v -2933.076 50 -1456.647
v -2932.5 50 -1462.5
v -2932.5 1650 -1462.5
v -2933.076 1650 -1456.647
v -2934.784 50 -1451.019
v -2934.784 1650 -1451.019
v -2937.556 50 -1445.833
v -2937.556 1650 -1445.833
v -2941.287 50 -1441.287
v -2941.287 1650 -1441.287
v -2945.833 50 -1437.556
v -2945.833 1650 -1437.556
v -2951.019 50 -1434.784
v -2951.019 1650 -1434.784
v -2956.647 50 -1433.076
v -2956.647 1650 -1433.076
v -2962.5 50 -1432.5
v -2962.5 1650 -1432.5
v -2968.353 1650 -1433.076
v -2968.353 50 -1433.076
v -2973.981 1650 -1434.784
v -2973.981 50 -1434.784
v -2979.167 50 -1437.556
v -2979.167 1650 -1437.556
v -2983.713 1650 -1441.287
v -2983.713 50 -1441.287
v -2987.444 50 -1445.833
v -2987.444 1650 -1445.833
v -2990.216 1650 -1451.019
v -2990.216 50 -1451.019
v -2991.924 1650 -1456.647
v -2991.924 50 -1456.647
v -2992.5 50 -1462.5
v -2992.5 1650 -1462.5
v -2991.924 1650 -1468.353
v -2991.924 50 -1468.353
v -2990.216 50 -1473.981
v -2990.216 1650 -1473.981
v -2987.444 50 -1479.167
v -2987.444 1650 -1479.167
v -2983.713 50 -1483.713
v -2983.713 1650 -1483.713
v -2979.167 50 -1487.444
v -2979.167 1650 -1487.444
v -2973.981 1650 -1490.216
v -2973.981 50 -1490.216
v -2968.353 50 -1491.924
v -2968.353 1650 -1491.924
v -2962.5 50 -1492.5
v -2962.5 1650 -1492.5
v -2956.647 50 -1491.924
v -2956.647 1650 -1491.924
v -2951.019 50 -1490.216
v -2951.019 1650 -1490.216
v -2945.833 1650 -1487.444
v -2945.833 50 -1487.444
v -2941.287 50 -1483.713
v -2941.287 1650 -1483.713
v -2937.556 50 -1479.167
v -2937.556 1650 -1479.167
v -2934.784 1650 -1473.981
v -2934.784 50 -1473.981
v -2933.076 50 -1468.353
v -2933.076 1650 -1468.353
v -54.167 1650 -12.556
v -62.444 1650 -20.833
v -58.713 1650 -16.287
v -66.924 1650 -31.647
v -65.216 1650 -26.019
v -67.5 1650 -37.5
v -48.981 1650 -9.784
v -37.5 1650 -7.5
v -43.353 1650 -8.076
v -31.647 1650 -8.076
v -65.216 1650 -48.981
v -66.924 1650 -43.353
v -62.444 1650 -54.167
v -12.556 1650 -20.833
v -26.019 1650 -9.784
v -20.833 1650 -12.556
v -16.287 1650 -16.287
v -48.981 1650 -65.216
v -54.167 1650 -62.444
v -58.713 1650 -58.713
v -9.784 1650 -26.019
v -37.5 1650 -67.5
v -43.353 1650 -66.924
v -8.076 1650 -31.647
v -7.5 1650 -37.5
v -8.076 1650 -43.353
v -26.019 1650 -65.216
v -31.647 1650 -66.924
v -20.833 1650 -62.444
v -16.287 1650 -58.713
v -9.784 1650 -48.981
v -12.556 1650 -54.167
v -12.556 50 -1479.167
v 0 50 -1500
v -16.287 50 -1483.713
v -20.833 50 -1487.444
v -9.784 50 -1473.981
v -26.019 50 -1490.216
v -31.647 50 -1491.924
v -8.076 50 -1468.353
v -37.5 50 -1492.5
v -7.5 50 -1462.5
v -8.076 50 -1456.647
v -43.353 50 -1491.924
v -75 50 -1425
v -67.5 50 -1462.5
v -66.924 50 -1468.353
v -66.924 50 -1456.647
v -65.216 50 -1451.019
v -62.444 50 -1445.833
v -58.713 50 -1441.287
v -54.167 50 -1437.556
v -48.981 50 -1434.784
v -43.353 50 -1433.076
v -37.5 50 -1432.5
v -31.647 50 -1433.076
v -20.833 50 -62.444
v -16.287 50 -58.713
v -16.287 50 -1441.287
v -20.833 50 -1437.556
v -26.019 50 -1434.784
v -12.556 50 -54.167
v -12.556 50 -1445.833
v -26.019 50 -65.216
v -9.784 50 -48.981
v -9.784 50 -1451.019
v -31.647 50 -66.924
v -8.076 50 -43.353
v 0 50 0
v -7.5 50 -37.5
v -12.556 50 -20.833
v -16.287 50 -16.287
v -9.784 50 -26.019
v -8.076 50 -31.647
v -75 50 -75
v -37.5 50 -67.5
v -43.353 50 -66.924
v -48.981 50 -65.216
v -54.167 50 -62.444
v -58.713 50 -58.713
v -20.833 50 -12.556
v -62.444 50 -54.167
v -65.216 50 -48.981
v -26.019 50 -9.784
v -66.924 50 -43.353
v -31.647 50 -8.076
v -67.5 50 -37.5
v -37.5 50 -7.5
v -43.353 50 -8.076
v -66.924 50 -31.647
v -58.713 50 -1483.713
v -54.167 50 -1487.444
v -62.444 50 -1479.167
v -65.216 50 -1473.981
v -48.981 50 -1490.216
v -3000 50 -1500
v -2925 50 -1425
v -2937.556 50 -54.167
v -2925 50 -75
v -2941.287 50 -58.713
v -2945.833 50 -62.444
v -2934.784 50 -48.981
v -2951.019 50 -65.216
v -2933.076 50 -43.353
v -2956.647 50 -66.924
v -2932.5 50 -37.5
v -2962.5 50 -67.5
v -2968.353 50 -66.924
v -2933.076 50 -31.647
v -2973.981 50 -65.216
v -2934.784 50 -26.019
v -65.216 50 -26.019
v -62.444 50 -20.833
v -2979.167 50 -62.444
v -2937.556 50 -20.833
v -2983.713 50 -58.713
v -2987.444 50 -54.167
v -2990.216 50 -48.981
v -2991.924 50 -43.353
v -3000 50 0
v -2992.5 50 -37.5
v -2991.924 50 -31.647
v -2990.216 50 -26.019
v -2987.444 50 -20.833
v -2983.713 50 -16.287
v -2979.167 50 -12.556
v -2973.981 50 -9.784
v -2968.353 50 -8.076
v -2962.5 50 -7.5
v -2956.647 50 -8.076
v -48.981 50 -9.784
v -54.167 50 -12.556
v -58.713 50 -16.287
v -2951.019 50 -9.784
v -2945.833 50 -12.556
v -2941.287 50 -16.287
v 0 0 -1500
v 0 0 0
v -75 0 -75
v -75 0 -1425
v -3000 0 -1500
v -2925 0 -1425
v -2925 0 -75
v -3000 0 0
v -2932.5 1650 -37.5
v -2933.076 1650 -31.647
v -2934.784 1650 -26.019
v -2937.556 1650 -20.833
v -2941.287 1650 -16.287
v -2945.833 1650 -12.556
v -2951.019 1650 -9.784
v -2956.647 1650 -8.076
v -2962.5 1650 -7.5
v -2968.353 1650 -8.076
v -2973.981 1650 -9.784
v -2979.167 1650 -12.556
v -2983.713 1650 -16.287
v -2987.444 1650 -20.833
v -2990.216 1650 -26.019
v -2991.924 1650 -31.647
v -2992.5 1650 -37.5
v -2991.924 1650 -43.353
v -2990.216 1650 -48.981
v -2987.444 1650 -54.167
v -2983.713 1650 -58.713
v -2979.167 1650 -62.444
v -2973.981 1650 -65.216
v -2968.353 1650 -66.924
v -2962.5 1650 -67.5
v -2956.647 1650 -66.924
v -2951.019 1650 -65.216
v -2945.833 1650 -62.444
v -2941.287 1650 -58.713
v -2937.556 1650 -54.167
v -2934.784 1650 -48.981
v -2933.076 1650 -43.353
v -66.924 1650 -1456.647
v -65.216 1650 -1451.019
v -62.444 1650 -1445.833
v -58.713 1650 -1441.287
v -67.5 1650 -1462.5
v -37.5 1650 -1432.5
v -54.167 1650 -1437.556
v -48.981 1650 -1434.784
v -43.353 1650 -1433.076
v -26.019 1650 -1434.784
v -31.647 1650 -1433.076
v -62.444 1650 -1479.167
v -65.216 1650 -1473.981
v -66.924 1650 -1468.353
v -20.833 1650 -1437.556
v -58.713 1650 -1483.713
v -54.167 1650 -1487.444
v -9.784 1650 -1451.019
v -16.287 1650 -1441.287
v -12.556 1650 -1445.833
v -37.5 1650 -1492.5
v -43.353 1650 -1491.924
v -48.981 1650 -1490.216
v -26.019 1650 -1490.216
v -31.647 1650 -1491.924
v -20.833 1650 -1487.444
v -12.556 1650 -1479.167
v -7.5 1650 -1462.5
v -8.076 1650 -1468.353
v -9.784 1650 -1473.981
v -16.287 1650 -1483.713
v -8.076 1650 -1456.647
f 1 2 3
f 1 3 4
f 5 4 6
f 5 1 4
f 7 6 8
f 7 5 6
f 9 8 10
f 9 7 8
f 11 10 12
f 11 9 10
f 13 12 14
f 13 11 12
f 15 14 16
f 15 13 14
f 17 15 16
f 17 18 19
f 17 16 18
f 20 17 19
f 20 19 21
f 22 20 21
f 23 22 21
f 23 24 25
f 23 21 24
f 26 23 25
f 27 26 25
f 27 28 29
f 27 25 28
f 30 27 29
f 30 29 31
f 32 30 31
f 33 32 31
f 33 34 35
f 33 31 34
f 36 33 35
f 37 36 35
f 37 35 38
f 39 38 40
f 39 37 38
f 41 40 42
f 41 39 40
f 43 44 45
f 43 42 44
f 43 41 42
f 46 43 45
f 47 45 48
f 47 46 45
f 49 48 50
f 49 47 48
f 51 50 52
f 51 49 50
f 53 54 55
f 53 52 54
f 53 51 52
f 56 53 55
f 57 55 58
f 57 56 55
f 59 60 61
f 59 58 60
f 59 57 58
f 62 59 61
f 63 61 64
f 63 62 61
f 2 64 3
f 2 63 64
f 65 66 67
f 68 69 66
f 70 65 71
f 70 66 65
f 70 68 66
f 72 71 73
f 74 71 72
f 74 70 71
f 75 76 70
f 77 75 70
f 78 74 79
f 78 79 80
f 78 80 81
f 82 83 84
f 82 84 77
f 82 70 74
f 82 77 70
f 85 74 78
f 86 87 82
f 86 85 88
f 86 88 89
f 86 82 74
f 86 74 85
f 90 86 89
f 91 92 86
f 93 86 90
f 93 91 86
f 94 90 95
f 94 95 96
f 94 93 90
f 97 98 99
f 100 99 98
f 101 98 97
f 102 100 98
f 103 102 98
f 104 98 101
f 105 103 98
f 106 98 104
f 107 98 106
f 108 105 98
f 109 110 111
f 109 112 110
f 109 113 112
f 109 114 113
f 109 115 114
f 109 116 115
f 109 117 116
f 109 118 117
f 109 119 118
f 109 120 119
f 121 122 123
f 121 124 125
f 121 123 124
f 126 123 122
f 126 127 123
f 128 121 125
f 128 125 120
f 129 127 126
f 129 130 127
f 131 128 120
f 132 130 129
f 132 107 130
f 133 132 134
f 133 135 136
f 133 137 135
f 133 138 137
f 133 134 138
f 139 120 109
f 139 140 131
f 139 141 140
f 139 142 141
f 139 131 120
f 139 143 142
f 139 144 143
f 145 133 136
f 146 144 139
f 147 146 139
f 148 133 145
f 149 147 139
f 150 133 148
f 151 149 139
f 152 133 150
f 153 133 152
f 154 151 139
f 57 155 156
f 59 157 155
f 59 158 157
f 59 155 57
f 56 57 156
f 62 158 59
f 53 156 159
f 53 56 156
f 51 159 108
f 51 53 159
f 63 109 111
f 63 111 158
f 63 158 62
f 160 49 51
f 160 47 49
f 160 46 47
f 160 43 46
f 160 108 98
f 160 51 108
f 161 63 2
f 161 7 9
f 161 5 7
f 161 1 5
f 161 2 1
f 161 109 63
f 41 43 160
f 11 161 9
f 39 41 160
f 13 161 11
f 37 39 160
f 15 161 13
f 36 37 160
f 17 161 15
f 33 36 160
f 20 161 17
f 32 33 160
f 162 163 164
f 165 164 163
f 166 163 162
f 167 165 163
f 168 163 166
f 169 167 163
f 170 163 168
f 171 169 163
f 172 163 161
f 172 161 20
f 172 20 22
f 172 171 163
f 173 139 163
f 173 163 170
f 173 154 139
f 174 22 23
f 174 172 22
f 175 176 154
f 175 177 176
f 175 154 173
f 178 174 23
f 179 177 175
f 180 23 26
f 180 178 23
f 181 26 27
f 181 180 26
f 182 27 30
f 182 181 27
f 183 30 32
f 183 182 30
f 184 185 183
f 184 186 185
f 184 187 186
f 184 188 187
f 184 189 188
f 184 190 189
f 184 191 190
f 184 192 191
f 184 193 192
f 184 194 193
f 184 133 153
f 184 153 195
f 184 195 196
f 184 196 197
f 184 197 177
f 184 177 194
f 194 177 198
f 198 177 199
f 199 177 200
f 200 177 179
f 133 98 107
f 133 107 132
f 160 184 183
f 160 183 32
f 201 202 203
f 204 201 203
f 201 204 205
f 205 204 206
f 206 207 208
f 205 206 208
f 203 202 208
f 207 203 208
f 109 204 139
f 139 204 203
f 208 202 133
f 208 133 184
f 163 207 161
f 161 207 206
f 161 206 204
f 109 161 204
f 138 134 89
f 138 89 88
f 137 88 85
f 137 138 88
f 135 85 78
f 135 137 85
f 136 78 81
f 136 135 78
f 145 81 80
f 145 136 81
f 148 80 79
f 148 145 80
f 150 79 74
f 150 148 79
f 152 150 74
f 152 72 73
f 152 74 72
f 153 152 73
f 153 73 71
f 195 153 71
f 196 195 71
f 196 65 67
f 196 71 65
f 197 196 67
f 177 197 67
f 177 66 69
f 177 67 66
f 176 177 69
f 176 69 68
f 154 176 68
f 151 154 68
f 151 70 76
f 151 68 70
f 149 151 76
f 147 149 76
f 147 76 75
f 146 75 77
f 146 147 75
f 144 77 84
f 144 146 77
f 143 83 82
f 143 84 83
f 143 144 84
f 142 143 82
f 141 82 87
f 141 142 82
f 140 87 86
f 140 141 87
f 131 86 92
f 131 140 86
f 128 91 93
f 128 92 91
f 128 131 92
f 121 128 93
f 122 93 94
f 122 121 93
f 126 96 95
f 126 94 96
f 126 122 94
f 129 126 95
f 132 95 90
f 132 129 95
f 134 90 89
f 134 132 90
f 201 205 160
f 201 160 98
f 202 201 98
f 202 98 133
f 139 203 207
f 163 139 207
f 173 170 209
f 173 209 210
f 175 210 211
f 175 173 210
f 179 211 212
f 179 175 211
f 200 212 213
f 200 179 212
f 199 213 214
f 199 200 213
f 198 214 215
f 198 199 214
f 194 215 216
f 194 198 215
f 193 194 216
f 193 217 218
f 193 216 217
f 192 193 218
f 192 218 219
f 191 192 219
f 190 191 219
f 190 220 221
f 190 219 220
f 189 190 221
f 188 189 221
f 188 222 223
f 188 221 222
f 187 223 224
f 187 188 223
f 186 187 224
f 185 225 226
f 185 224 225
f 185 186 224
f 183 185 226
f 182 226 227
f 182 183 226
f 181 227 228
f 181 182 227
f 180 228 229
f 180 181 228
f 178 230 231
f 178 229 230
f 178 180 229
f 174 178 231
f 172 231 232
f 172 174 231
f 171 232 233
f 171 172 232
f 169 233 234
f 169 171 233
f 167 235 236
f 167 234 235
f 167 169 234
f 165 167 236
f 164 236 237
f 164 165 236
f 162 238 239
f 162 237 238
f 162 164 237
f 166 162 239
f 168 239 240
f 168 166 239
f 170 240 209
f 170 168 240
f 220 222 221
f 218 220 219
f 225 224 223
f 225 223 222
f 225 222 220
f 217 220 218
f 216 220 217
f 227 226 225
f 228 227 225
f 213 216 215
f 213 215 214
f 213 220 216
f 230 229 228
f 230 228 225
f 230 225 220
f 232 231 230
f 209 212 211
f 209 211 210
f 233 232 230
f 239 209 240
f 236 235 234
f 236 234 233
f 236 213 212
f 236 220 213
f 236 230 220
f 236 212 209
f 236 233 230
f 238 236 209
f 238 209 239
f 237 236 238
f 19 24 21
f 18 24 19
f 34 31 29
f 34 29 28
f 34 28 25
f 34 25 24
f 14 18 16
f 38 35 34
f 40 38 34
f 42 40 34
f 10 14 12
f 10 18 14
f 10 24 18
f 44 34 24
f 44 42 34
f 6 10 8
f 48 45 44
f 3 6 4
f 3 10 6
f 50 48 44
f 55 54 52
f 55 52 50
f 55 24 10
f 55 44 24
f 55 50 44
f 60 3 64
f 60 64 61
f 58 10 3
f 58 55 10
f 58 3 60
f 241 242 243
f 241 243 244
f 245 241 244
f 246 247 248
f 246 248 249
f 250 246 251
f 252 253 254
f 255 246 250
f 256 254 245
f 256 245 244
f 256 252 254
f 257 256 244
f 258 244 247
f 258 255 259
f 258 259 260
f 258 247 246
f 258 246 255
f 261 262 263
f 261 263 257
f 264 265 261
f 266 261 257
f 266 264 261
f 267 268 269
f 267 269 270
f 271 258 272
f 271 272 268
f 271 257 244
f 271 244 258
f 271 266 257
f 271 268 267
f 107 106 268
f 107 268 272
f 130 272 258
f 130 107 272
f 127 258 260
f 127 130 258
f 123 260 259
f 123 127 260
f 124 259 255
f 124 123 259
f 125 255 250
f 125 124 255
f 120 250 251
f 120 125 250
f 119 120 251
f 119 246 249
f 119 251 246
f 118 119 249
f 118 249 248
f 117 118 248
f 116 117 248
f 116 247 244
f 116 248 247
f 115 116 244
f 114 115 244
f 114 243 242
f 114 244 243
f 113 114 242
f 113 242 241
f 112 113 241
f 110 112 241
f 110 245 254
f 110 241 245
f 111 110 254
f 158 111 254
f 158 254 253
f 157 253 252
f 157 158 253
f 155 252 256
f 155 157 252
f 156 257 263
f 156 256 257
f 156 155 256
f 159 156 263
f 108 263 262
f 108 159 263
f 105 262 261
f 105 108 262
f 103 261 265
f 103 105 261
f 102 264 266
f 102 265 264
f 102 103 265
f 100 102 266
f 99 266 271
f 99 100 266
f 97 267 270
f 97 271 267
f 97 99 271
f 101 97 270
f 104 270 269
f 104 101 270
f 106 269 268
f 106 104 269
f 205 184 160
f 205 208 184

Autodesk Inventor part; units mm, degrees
ref_plane "YZ Plane" through (0, 0, 0) normal (1, 0, 0) x (0, 1, 0)
ref_plane "XZ Plane" through (0, 0, 0) normal (0, 1, 0) x (-1, 0, 0)
ref_plane "XY Plane" through (0, 0, 0) normal (0, 0, 1) x (1, 0, 0)
sketch "Sketch1" plane through (0, 0, 0) normal (0, 1, 0) x (-1, 0, 0)
  line L0 (0, 0) -> (3000, 0)
  line L1 (3000, 0) -> (3000, -1500)
  line L2 (3000, -1500) -> (0, -1500)
  line L3 (0, -1500) -> (0, 0)
  line L4 (75, -75) -> (2925, -75)
  line L5 (2925, -75) -> (2925, -1425)
  line L6 (2925, -1425) -> (75, -1425)
  line L7 (75, -1425) -> (75, -75)
  dimension "d0" = 3000
  dimension "d1" = 1500
  dimension "d2" = 75
  dimension "d3" = 1350
  dimension "d4" = 75
  dimension "d5" = 2850
extrude "Extrusion1" add sketch "Sketch1" along normal blind 50
sketch "Sketch2" plane through (0, 50, 0) normal (0, 1, 0) x (1, 0, 0)
  circle A0 centre (-2962.5, 37.5) radius 30
  line L0 (-3000, 0) -> (0, 0) projected
  line L1 (-75, 75) -> (-2925, 75) projected
  line L2 (-3000, 1500) -> (-3000, 0) projected
  line L3 (-2925, 75) -> (-2925, 1425) projected
  line L4 (-1500, 750) -> (-3750.0767, 750)
  line L5 (-1500, 750) -> (-1500, 2776.2383)
  circle A1 centre (-2962.5, 1462.5) radius 30
  circle A2 centre (-37.5, 37.5) radius 30
  circle A3 centre (-37.5, 1462.5) radius 30
  dimension "d8" = 75
  dimension "d9" = 60
  dimension "d10" = 37.5
  dimension "d11" = 75
  dimension "d12" = 37.5
extrude "Extrusion2" add sketch "Sketch2" along normal blind 1600
equation "\"d2\" = 0.05 * d1"
equation "\"d3\" = d1 - 2 * d2"
equation "\"d4\" = 0.025 * d0"
equation "\"d5\" = d0 - 2 * d4"
equation "\"d9\" = 0.8 * d8"
equation "\"d10\" = 0.5 * d8 + 0 * d9"
equation "\"d12\" = 0.5 * d11 + 0 * d9"
properties part number "LedSystem"
